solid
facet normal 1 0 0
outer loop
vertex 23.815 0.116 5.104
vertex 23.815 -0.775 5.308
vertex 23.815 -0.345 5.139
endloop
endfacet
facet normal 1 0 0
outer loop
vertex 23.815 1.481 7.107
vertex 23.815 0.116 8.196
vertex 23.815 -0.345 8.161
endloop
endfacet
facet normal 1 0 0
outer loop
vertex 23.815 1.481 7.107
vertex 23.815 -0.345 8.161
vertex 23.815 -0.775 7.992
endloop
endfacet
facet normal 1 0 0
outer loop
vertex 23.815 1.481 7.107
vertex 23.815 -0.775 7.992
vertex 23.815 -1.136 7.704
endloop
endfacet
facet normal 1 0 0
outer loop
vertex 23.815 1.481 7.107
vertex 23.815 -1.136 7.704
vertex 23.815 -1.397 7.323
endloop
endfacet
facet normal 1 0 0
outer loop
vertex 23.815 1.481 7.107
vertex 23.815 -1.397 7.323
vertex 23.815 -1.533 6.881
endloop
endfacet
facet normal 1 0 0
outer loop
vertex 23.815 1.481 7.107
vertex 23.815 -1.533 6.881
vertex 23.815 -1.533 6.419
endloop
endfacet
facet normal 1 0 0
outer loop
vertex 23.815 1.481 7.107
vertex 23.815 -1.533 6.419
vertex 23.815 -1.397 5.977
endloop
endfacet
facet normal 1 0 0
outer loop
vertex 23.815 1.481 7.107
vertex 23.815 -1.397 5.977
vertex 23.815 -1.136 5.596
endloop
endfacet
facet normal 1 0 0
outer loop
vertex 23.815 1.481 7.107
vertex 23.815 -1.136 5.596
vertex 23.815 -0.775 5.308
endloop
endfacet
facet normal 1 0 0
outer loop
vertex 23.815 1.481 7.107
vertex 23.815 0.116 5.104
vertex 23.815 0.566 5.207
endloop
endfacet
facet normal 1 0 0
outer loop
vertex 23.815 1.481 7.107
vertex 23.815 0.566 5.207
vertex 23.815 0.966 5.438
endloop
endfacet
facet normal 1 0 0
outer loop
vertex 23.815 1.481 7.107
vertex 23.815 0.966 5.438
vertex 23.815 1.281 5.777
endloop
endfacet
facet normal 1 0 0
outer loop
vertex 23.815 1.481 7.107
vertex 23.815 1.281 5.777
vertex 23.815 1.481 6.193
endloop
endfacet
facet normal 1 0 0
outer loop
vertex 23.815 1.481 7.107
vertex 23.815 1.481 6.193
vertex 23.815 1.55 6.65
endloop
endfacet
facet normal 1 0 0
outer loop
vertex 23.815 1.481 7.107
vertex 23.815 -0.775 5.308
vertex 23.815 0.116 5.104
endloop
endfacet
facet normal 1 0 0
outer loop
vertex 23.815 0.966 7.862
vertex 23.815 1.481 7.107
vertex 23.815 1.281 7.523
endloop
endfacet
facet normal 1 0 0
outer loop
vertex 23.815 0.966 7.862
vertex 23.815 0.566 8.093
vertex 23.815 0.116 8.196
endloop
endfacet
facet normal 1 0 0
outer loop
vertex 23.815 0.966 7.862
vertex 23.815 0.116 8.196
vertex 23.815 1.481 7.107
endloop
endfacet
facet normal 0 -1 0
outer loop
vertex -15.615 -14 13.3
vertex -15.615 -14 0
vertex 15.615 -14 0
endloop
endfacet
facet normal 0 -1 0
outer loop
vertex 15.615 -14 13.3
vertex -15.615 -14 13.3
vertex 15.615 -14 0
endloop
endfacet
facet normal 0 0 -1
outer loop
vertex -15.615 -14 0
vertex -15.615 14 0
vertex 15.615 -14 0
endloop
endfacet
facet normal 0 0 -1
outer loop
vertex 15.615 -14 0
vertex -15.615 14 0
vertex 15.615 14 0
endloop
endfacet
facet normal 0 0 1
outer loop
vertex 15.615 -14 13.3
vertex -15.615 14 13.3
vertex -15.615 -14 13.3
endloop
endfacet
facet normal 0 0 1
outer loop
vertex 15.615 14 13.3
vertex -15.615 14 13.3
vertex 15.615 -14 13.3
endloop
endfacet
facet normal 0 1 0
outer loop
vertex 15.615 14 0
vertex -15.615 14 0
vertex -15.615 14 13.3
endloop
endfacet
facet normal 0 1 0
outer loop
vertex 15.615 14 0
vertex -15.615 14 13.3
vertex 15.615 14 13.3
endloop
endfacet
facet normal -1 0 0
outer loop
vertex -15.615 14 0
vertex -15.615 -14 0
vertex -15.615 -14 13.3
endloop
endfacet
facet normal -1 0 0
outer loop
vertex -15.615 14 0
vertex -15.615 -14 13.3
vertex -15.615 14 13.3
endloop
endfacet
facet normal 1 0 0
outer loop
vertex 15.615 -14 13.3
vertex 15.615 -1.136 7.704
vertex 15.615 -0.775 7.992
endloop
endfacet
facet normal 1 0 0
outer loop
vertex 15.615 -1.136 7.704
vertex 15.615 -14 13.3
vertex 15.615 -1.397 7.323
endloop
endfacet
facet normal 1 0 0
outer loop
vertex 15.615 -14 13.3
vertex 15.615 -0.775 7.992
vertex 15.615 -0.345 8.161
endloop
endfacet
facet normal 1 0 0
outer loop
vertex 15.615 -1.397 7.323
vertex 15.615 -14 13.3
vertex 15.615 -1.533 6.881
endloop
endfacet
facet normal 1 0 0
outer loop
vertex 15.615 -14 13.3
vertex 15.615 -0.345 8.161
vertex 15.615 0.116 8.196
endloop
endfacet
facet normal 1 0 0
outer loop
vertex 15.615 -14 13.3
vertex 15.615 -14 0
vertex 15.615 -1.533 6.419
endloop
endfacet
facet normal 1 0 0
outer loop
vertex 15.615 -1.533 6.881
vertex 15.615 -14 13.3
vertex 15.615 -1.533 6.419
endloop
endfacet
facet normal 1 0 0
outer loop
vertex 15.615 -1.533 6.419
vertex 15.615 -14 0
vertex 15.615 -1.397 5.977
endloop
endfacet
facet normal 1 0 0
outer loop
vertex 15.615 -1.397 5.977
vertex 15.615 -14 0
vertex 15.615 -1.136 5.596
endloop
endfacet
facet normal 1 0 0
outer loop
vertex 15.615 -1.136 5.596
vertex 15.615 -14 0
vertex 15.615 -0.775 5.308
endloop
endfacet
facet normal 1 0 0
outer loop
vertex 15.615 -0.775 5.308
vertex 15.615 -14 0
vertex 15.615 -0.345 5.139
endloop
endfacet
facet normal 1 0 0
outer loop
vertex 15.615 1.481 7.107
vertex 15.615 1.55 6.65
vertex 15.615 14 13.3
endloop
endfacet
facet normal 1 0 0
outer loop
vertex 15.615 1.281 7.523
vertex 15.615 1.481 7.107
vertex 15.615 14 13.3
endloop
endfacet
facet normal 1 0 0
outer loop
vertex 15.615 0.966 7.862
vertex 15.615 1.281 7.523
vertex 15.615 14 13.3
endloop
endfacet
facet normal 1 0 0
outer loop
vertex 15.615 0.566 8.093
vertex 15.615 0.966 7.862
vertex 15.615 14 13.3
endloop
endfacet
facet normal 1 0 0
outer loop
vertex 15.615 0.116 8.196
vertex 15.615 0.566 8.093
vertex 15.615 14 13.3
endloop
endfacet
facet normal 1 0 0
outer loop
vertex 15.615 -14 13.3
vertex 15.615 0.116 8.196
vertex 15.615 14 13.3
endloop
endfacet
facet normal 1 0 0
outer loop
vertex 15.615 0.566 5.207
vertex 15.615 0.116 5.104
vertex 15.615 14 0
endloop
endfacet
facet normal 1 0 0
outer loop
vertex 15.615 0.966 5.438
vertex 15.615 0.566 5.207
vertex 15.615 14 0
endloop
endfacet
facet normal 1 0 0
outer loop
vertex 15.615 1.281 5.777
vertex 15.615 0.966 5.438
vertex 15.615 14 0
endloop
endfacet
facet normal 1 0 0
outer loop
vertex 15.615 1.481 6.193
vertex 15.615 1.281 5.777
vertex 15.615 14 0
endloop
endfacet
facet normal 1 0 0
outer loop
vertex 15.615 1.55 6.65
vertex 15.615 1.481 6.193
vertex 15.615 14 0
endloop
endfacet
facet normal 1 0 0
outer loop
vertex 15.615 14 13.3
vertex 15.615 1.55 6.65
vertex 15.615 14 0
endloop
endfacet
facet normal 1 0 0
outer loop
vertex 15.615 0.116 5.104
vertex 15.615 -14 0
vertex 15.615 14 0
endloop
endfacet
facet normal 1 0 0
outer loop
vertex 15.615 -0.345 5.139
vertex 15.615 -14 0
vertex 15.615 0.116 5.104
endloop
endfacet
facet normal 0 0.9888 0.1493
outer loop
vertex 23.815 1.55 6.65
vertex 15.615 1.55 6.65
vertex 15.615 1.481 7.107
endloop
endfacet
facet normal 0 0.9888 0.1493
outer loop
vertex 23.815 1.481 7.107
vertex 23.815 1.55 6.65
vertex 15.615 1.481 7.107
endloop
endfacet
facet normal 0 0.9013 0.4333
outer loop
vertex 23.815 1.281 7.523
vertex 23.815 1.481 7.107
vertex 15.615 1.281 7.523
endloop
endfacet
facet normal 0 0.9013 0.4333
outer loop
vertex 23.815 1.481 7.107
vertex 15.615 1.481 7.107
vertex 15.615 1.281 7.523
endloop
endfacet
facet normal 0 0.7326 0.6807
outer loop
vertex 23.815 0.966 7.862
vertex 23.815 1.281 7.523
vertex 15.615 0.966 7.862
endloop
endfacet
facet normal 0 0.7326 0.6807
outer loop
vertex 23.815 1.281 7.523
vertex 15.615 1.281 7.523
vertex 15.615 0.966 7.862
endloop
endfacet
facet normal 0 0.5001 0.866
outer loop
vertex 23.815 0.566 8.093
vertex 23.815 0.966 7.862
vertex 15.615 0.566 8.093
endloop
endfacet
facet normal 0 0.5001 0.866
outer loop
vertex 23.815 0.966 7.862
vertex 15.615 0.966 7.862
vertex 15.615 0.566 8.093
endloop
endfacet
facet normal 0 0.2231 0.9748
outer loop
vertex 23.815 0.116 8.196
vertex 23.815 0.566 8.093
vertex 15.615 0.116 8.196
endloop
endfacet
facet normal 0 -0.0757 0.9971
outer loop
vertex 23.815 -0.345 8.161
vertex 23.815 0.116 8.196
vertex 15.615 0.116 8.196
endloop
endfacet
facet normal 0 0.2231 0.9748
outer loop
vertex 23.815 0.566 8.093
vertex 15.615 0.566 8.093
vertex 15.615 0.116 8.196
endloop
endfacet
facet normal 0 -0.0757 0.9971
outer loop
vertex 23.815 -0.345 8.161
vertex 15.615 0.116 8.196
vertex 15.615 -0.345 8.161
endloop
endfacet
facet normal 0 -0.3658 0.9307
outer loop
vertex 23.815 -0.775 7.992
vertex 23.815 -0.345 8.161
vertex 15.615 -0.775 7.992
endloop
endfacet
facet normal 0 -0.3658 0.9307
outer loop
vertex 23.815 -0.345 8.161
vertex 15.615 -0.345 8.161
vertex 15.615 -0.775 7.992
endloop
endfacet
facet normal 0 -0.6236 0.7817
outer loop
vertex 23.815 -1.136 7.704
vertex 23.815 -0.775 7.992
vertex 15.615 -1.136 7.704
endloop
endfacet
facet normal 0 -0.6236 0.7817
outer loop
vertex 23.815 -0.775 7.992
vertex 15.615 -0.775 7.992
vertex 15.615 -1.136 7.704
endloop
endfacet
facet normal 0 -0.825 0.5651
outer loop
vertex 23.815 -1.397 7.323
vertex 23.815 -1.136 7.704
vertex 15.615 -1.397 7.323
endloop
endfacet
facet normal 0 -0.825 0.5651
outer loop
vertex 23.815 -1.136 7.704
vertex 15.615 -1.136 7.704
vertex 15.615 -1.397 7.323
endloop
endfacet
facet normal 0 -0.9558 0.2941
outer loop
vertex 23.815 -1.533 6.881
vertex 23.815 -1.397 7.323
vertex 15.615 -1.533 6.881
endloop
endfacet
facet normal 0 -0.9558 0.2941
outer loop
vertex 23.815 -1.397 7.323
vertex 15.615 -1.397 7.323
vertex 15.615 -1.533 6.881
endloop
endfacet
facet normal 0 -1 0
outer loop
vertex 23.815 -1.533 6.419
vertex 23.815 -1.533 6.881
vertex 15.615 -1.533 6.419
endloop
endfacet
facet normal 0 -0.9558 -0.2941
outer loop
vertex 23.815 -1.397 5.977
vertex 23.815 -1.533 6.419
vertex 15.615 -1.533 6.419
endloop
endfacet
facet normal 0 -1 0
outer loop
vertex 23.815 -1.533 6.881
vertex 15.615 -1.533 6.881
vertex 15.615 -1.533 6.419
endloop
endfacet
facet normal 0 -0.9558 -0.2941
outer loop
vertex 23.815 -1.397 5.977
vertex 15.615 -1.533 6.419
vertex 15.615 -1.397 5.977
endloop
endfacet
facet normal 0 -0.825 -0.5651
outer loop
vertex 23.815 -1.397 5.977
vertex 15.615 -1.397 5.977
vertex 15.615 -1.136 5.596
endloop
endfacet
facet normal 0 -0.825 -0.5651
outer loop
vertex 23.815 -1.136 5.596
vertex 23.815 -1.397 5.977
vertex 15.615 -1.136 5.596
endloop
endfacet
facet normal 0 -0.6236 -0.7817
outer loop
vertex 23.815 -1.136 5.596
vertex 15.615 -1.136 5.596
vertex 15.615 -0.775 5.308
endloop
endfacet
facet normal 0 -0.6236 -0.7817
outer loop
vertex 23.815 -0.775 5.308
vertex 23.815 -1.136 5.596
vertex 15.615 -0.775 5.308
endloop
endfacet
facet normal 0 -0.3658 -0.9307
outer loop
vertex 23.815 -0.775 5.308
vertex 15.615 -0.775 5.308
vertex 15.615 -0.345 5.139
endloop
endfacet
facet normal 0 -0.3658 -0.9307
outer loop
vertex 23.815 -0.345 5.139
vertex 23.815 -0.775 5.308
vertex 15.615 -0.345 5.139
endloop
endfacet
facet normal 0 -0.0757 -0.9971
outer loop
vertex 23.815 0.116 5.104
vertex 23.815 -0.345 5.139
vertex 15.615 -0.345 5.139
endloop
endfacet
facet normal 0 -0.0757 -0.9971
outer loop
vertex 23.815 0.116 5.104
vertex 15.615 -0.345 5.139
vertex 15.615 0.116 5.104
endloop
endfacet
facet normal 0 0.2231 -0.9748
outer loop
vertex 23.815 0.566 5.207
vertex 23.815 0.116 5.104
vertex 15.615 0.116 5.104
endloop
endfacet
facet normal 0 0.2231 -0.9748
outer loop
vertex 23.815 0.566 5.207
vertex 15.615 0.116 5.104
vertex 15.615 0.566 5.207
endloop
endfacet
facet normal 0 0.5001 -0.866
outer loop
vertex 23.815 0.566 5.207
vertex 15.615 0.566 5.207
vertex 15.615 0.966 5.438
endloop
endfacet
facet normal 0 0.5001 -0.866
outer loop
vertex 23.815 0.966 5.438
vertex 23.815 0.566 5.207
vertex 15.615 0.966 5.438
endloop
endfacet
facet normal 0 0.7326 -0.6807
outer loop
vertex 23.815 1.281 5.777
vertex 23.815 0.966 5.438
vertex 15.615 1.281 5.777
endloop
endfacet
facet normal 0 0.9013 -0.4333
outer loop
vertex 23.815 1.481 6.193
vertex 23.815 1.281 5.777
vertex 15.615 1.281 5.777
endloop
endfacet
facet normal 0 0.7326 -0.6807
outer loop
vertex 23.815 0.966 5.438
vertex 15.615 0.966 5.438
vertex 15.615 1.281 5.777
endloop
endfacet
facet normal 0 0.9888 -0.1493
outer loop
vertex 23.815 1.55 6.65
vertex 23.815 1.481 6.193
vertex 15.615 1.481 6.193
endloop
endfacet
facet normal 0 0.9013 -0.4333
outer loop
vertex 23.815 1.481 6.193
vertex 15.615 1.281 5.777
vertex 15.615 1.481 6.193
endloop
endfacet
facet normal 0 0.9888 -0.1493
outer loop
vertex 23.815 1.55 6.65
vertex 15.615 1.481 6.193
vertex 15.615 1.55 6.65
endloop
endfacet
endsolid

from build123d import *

# Parameters (mm, degrees)
F0_W     = 31.23
F0_H     = 28
F1_DEPTH = 13.3
F2_R     = 1.55
F3_DEPTH = 8.2


with BuildPart() as f1:
    # F0 (on Top) → F1 (new body)
    with BuildSketch(Plane.XY):
        Rectangle(F0_W, F0_H)
    extrude(amount=F1_DEPTH)

    # F2 (on face) → F3 (join)
    with BuildSketch(Plane.YZ.offset(15.615)):
        with Locations((0, 6.65)):
            Circle(F2_R)
    extrude(amount=F3_DEPTH)


solid = f1.part
